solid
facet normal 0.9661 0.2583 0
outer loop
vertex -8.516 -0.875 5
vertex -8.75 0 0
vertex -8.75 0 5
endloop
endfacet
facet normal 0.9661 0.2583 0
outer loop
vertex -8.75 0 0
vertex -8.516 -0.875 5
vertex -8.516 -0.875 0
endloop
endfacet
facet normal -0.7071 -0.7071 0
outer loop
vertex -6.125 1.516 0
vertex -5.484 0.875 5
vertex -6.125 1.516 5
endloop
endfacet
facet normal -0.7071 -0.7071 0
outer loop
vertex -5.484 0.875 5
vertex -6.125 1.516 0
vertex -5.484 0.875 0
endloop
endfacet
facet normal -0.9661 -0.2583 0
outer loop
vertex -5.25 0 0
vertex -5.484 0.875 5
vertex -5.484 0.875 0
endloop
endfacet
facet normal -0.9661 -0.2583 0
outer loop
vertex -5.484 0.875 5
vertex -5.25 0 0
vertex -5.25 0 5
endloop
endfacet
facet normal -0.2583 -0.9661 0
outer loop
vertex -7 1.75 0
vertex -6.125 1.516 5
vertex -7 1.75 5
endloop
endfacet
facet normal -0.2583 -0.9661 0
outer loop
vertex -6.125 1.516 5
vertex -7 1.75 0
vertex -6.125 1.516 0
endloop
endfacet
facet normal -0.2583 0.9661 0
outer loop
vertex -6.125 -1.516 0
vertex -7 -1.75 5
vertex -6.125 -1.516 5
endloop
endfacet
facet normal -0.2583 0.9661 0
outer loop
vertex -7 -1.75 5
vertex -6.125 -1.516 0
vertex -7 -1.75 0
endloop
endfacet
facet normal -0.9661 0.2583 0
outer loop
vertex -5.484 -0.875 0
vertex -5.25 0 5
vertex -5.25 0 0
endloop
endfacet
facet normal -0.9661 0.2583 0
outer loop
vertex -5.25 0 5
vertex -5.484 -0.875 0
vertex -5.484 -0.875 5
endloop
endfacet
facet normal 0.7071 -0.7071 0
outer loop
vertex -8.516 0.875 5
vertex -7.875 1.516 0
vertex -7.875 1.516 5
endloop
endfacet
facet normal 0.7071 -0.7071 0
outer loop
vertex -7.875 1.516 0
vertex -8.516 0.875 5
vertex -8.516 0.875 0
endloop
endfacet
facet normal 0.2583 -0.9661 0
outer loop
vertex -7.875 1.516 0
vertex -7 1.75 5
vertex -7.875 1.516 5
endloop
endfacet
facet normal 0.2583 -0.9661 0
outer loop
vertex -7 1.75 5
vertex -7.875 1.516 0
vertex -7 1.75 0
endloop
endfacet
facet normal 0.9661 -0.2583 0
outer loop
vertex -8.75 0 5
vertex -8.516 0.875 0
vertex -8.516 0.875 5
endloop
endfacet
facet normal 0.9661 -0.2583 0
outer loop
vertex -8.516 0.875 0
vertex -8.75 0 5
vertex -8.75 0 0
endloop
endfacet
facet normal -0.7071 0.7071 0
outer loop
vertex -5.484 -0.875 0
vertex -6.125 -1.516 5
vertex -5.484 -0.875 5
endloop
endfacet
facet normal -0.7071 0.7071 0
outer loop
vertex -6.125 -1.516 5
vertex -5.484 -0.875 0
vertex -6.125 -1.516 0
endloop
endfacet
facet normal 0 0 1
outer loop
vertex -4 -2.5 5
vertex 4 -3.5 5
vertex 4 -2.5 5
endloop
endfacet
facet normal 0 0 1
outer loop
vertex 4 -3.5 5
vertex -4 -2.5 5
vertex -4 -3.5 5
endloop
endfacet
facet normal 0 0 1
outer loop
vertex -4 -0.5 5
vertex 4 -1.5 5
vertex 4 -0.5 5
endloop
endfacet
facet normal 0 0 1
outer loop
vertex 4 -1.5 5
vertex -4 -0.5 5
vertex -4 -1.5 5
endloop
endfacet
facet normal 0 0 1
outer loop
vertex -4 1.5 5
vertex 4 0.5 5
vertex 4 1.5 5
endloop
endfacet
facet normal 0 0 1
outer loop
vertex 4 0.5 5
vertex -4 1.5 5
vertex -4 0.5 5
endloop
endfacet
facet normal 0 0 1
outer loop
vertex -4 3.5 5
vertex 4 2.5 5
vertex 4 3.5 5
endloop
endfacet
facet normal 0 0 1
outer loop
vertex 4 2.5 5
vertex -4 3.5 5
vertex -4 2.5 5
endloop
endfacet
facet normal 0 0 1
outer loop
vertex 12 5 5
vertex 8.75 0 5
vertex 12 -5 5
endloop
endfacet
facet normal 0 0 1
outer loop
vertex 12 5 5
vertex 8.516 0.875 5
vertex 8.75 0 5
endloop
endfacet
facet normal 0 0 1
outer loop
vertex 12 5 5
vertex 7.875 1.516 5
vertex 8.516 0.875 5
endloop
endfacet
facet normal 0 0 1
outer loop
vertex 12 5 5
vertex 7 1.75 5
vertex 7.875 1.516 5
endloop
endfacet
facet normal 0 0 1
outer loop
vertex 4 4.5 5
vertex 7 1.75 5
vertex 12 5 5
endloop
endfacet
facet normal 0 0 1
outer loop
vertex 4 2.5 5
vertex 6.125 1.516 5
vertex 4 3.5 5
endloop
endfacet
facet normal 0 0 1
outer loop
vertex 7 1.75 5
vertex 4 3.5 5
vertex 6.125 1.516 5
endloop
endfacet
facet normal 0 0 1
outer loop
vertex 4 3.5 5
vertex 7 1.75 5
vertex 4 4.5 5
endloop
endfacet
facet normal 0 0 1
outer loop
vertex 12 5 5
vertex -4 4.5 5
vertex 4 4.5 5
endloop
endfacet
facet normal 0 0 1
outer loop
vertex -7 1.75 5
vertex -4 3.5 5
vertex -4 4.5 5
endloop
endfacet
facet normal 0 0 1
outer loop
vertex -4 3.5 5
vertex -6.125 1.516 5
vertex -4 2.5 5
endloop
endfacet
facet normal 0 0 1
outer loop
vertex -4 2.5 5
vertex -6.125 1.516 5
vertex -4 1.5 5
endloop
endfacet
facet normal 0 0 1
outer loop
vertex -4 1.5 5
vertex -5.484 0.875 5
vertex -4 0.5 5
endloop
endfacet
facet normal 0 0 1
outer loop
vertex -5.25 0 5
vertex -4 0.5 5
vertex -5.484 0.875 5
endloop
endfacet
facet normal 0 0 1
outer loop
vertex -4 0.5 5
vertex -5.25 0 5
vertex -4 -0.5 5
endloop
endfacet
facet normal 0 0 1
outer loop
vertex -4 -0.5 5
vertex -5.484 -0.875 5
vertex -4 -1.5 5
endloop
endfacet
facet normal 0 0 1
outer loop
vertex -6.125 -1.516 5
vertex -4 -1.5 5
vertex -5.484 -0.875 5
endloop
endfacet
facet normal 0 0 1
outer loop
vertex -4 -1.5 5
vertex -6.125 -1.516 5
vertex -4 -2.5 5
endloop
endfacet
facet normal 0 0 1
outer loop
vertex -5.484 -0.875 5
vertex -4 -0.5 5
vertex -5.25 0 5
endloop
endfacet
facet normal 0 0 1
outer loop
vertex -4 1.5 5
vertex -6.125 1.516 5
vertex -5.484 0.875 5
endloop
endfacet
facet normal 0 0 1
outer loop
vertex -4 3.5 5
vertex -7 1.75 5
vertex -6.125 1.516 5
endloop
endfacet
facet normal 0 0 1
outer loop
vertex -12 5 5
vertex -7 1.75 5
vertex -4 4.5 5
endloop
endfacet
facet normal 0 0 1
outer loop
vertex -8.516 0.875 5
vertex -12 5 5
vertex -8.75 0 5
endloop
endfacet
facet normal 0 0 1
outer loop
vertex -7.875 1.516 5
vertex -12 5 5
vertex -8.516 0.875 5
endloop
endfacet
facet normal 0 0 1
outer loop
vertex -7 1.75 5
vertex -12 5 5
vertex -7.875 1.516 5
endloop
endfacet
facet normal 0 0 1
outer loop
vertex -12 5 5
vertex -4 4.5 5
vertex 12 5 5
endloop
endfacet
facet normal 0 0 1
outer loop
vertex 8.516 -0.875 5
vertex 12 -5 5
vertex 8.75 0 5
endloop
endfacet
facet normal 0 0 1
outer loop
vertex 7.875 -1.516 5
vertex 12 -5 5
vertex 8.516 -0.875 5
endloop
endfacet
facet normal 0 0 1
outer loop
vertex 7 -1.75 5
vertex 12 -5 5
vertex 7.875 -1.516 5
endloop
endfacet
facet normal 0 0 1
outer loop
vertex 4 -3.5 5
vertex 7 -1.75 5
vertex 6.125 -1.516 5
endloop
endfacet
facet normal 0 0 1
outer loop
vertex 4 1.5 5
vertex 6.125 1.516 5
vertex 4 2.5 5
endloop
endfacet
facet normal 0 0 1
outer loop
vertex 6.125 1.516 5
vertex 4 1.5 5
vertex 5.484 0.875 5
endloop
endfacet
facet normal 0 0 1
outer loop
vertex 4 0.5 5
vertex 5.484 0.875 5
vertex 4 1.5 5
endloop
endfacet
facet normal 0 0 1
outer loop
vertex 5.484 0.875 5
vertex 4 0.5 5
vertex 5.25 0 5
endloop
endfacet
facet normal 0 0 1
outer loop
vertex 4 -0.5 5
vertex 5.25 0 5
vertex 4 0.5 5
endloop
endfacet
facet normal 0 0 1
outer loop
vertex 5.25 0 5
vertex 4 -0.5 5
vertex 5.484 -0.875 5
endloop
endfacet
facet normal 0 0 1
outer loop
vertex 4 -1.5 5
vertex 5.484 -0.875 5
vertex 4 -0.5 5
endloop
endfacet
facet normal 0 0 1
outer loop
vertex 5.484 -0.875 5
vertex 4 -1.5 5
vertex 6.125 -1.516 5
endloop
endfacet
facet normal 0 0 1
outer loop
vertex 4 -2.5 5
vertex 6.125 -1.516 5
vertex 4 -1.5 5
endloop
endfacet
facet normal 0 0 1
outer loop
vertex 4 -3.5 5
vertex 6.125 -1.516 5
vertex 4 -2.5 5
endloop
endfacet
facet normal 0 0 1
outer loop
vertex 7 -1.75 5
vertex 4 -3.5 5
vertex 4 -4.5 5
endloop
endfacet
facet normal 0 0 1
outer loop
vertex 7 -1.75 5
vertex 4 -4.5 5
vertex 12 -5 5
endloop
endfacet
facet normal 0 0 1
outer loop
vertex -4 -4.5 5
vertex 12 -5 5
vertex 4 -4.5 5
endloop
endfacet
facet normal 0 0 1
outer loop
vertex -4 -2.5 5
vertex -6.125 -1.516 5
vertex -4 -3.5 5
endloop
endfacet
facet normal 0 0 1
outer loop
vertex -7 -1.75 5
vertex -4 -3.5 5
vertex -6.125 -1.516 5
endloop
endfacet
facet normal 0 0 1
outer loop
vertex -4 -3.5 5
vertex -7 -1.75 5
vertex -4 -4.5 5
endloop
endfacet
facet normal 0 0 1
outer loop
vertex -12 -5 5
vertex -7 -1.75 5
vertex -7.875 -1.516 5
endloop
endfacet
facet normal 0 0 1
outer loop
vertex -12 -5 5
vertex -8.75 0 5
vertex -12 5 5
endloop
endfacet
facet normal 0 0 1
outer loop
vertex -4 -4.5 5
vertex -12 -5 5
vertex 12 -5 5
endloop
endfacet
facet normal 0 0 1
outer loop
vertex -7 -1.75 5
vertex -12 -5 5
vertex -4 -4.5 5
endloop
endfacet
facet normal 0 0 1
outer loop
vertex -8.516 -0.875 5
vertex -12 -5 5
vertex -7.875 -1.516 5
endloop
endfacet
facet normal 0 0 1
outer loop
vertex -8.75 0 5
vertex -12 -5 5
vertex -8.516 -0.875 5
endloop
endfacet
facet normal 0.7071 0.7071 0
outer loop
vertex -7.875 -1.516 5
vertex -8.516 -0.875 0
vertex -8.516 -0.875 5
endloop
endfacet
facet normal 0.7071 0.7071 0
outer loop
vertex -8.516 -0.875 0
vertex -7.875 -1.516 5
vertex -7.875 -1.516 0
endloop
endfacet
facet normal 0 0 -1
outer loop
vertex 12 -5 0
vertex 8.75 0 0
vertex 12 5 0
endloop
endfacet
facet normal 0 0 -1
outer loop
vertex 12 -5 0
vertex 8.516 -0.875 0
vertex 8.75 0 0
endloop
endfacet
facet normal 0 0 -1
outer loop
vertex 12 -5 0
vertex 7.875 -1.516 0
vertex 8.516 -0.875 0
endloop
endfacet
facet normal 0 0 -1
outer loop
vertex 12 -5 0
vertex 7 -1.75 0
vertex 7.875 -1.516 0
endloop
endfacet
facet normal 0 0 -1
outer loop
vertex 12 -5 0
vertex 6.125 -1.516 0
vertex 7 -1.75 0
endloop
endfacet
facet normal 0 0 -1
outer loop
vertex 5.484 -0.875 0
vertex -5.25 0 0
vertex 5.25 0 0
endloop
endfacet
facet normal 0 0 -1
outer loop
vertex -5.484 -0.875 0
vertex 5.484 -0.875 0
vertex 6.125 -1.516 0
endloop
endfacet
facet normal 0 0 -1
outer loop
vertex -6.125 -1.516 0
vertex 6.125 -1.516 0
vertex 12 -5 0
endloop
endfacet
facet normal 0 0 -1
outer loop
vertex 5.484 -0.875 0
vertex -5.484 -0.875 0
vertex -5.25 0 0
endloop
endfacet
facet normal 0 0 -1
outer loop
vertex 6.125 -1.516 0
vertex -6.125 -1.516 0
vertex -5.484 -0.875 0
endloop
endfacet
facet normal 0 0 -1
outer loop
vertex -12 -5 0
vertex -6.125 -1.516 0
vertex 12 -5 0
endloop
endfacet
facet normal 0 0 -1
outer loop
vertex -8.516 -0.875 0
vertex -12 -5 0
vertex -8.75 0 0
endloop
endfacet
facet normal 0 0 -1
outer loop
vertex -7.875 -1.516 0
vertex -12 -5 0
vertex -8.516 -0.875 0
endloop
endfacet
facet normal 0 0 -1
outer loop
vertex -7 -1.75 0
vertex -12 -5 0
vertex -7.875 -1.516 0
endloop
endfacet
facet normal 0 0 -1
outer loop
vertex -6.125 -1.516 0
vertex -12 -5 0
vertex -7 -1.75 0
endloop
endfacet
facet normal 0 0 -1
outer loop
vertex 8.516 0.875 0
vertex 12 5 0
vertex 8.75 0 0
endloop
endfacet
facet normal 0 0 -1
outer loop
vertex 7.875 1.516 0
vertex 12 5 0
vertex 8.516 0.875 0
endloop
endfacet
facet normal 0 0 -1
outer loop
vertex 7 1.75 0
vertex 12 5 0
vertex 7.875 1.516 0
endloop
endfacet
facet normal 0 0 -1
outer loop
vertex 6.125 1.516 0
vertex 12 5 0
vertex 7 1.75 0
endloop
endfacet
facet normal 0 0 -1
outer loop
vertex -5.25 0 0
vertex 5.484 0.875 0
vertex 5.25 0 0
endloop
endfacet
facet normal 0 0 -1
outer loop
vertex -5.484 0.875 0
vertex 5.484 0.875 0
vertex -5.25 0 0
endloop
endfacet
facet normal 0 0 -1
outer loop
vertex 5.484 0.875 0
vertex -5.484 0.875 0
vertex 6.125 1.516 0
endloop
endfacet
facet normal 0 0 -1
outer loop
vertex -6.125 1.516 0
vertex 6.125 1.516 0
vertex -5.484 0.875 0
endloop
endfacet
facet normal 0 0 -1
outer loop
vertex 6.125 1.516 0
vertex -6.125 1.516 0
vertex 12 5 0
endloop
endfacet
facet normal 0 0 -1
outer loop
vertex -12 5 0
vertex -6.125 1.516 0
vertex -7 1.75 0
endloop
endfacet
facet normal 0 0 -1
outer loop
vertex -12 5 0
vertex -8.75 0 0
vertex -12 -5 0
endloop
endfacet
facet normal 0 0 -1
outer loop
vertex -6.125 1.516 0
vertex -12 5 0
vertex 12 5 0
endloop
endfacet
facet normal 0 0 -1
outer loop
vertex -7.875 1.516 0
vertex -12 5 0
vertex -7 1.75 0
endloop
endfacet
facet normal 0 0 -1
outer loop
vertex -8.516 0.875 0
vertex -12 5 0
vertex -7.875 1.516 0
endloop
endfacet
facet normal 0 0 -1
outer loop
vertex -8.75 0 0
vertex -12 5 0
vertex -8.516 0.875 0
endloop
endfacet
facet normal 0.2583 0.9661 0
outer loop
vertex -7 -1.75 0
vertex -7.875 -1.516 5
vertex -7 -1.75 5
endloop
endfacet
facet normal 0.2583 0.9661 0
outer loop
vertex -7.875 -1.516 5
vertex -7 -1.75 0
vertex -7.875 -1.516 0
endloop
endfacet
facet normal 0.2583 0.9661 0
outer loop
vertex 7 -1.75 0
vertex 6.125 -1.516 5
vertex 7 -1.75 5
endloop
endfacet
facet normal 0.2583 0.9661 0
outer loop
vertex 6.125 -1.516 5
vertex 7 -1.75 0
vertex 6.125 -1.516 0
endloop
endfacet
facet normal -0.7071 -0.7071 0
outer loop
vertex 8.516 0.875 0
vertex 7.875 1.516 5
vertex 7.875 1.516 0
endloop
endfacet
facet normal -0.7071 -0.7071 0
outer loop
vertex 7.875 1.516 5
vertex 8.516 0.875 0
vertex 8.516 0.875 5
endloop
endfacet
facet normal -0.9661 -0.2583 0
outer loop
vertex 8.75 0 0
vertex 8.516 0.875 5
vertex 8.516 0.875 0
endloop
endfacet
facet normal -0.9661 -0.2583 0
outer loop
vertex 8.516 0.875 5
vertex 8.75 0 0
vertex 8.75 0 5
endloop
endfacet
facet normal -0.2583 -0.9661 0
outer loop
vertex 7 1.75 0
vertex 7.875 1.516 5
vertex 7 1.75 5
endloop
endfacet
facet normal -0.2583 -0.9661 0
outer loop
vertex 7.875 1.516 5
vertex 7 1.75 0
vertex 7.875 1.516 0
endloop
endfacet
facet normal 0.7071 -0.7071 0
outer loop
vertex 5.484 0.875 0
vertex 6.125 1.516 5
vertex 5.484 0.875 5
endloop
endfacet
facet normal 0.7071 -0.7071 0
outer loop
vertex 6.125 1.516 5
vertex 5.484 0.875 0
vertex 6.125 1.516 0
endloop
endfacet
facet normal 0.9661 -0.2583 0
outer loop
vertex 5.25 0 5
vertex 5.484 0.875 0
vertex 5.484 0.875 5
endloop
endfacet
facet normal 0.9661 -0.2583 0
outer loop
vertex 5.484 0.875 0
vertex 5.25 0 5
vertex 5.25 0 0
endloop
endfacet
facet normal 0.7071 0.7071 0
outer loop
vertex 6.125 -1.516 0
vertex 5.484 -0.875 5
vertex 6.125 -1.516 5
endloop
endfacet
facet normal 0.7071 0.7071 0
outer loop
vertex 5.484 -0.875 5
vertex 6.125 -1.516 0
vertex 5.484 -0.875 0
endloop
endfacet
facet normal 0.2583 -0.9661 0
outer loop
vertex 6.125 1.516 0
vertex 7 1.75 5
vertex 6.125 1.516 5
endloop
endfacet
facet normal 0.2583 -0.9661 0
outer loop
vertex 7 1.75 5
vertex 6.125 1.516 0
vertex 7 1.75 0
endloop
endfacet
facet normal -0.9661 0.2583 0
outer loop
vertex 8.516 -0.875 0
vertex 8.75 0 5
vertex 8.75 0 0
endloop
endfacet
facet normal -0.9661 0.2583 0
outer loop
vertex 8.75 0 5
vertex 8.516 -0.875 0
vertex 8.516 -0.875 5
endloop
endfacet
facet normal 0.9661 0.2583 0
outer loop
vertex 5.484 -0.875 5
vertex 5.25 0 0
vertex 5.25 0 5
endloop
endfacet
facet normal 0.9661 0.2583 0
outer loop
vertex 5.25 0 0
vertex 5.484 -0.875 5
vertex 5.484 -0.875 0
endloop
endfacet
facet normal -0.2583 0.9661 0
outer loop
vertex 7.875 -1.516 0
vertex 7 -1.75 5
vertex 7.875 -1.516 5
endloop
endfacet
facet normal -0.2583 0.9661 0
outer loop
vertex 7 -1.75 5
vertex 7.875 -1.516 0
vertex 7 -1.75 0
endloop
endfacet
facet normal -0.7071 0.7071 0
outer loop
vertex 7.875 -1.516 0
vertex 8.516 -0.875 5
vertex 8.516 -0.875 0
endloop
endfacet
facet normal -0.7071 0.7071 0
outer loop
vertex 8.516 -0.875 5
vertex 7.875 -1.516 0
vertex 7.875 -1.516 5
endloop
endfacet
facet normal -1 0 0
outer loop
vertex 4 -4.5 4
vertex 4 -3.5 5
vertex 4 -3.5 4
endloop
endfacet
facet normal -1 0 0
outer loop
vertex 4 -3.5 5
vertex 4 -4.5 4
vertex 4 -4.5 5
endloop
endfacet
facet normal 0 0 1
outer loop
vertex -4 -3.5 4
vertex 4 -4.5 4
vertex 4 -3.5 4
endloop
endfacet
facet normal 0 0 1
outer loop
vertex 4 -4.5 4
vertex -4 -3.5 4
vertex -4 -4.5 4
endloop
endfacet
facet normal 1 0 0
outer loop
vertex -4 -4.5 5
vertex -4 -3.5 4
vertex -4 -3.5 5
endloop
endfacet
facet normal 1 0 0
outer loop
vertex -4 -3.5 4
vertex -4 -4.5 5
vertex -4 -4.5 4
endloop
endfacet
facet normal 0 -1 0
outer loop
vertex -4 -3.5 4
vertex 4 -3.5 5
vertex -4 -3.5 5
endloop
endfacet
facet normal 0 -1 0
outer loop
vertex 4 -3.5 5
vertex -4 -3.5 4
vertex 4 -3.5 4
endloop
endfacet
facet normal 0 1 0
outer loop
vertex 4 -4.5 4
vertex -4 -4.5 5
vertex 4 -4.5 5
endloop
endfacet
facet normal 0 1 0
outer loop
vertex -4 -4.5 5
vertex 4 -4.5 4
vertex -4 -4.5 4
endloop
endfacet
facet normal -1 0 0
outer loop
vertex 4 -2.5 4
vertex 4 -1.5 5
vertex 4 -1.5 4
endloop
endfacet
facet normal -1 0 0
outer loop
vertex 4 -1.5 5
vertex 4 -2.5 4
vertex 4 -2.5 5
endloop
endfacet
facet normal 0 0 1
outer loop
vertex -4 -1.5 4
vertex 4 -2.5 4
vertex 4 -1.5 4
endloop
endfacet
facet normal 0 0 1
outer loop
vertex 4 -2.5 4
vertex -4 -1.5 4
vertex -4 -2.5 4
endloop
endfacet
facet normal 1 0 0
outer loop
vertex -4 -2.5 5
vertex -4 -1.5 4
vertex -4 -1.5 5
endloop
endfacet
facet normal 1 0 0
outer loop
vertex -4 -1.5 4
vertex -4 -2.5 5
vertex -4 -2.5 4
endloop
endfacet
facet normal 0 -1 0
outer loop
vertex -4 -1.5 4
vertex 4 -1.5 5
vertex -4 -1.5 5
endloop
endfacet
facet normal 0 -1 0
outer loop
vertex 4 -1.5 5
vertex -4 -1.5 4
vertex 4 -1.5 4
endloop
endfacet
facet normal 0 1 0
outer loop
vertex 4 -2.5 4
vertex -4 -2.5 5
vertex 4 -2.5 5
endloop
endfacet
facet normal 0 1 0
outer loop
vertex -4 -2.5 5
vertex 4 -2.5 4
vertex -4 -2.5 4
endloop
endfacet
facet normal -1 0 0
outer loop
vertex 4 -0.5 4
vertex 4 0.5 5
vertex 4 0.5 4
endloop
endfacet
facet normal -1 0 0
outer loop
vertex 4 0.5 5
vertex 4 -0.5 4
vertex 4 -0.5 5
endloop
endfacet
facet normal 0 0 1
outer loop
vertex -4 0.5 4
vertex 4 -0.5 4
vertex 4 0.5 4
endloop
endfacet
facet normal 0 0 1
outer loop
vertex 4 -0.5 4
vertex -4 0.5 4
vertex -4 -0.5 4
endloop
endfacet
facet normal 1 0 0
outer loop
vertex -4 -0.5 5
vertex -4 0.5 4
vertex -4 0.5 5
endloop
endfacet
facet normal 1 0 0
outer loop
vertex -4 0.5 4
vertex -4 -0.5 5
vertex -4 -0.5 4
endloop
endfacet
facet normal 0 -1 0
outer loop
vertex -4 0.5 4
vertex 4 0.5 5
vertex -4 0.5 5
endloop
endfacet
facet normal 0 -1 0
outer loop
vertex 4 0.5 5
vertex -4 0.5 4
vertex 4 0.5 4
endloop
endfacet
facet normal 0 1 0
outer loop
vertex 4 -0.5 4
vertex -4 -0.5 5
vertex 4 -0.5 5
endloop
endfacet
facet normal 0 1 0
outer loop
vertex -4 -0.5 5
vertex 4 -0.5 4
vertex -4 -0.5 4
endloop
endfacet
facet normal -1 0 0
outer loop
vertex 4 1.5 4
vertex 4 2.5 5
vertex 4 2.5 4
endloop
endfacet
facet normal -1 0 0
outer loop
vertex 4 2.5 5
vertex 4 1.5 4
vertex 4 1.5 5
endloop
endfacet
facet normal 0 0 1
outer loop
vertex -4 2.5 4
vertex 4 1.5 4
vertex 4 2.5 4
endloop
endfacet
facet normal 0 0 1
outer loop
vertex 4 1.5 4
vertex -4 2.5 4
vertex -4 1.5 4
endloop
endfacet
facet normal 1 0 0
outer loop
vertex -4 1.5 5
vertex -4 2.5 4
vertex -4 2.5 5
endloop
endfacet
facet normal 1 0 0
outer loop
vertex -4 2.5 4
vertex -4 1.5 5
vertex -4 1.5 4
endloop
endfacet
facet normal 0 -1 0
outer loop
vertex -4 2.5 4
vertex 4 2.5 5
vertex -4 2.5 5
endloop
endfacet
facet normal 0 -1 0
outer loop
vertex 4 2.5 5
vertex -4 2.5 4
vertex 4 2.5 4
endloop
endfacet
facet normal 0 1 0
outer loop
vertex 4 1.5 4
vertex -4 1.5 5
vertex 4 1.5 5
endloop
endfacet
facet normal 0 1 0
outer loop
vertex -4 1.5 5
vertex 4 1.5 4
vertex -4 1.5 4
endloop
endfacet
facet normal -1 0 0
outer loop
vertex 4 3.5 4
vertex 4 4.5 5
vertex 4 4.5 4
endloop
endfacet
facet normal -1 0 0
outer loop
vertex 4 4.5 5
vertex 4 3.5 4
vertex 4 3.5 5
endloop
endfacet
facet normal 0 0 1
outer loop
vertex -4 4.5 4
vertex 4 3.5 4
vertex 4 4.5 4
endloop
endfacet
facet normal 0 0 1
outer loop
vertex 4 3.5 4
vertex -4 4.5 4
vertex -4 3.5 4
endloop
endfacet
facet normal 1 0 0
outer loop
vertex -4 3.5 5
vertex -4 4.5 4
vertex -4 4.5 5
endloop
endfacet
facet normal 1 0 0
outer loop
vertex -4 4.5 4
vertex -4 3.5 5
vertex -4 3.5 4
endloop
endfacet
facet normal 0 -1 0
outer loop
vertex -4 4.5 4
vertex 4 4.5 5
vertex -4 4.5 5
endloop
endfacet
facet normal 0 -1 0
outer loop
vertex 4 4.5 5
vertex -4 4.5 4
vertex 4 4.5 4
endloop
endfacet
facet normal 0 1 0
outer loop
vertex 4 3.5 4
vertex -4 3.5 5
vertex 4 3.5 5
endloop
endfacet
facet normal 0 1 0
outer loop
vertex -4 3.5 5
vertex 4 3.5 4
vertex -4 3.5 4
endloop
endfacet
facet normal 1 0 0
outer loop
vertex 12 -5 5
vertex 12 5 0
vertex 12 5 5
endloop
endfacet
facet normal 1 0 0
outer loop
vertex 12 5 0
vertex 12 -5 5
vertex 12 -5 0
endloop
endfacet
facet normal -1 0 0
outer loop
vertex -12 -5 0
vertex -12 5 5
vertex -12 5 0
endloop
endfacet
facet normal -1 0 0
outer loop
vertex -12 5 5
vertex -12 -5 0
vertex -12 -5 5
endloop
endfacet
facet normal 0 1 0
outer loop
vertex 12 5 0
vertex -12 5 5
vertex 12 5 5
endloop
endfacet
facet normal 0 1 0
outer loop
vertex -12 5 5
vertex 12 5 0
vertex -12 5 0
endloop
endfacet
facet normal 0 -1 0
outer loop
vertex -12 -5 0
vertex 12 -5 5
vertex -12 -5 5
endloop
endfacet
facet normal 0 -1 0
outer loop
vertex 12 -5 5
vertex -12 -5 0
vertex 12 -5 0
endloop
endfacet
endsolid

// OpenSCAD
difference()
{
    union()
    {
        translate([-(14+10)/2,-10/2,0])
            cube([14+10,10,5]);
        
    }
    union()
    {
        translate([-7,0,0])
            cylinder(d=3.5,h=5,$fn=12);
        translate([7,0,0])
            cylinder(d=3.5,h=5,$fn=12);
        
        translate([-4,-4-.5,4])
            cube([8,1,1]);
        translate([-4,-2-.5,4])
            cube([8,1,1]);
        translate([-4,-0-.5,4])
            cube([8,1,1]);
        translate([-4,2-.5,4])
            cube([8,1,1]);
        translate([-4,4-.5,4])
            cube([8,1,1]);
    }
}
